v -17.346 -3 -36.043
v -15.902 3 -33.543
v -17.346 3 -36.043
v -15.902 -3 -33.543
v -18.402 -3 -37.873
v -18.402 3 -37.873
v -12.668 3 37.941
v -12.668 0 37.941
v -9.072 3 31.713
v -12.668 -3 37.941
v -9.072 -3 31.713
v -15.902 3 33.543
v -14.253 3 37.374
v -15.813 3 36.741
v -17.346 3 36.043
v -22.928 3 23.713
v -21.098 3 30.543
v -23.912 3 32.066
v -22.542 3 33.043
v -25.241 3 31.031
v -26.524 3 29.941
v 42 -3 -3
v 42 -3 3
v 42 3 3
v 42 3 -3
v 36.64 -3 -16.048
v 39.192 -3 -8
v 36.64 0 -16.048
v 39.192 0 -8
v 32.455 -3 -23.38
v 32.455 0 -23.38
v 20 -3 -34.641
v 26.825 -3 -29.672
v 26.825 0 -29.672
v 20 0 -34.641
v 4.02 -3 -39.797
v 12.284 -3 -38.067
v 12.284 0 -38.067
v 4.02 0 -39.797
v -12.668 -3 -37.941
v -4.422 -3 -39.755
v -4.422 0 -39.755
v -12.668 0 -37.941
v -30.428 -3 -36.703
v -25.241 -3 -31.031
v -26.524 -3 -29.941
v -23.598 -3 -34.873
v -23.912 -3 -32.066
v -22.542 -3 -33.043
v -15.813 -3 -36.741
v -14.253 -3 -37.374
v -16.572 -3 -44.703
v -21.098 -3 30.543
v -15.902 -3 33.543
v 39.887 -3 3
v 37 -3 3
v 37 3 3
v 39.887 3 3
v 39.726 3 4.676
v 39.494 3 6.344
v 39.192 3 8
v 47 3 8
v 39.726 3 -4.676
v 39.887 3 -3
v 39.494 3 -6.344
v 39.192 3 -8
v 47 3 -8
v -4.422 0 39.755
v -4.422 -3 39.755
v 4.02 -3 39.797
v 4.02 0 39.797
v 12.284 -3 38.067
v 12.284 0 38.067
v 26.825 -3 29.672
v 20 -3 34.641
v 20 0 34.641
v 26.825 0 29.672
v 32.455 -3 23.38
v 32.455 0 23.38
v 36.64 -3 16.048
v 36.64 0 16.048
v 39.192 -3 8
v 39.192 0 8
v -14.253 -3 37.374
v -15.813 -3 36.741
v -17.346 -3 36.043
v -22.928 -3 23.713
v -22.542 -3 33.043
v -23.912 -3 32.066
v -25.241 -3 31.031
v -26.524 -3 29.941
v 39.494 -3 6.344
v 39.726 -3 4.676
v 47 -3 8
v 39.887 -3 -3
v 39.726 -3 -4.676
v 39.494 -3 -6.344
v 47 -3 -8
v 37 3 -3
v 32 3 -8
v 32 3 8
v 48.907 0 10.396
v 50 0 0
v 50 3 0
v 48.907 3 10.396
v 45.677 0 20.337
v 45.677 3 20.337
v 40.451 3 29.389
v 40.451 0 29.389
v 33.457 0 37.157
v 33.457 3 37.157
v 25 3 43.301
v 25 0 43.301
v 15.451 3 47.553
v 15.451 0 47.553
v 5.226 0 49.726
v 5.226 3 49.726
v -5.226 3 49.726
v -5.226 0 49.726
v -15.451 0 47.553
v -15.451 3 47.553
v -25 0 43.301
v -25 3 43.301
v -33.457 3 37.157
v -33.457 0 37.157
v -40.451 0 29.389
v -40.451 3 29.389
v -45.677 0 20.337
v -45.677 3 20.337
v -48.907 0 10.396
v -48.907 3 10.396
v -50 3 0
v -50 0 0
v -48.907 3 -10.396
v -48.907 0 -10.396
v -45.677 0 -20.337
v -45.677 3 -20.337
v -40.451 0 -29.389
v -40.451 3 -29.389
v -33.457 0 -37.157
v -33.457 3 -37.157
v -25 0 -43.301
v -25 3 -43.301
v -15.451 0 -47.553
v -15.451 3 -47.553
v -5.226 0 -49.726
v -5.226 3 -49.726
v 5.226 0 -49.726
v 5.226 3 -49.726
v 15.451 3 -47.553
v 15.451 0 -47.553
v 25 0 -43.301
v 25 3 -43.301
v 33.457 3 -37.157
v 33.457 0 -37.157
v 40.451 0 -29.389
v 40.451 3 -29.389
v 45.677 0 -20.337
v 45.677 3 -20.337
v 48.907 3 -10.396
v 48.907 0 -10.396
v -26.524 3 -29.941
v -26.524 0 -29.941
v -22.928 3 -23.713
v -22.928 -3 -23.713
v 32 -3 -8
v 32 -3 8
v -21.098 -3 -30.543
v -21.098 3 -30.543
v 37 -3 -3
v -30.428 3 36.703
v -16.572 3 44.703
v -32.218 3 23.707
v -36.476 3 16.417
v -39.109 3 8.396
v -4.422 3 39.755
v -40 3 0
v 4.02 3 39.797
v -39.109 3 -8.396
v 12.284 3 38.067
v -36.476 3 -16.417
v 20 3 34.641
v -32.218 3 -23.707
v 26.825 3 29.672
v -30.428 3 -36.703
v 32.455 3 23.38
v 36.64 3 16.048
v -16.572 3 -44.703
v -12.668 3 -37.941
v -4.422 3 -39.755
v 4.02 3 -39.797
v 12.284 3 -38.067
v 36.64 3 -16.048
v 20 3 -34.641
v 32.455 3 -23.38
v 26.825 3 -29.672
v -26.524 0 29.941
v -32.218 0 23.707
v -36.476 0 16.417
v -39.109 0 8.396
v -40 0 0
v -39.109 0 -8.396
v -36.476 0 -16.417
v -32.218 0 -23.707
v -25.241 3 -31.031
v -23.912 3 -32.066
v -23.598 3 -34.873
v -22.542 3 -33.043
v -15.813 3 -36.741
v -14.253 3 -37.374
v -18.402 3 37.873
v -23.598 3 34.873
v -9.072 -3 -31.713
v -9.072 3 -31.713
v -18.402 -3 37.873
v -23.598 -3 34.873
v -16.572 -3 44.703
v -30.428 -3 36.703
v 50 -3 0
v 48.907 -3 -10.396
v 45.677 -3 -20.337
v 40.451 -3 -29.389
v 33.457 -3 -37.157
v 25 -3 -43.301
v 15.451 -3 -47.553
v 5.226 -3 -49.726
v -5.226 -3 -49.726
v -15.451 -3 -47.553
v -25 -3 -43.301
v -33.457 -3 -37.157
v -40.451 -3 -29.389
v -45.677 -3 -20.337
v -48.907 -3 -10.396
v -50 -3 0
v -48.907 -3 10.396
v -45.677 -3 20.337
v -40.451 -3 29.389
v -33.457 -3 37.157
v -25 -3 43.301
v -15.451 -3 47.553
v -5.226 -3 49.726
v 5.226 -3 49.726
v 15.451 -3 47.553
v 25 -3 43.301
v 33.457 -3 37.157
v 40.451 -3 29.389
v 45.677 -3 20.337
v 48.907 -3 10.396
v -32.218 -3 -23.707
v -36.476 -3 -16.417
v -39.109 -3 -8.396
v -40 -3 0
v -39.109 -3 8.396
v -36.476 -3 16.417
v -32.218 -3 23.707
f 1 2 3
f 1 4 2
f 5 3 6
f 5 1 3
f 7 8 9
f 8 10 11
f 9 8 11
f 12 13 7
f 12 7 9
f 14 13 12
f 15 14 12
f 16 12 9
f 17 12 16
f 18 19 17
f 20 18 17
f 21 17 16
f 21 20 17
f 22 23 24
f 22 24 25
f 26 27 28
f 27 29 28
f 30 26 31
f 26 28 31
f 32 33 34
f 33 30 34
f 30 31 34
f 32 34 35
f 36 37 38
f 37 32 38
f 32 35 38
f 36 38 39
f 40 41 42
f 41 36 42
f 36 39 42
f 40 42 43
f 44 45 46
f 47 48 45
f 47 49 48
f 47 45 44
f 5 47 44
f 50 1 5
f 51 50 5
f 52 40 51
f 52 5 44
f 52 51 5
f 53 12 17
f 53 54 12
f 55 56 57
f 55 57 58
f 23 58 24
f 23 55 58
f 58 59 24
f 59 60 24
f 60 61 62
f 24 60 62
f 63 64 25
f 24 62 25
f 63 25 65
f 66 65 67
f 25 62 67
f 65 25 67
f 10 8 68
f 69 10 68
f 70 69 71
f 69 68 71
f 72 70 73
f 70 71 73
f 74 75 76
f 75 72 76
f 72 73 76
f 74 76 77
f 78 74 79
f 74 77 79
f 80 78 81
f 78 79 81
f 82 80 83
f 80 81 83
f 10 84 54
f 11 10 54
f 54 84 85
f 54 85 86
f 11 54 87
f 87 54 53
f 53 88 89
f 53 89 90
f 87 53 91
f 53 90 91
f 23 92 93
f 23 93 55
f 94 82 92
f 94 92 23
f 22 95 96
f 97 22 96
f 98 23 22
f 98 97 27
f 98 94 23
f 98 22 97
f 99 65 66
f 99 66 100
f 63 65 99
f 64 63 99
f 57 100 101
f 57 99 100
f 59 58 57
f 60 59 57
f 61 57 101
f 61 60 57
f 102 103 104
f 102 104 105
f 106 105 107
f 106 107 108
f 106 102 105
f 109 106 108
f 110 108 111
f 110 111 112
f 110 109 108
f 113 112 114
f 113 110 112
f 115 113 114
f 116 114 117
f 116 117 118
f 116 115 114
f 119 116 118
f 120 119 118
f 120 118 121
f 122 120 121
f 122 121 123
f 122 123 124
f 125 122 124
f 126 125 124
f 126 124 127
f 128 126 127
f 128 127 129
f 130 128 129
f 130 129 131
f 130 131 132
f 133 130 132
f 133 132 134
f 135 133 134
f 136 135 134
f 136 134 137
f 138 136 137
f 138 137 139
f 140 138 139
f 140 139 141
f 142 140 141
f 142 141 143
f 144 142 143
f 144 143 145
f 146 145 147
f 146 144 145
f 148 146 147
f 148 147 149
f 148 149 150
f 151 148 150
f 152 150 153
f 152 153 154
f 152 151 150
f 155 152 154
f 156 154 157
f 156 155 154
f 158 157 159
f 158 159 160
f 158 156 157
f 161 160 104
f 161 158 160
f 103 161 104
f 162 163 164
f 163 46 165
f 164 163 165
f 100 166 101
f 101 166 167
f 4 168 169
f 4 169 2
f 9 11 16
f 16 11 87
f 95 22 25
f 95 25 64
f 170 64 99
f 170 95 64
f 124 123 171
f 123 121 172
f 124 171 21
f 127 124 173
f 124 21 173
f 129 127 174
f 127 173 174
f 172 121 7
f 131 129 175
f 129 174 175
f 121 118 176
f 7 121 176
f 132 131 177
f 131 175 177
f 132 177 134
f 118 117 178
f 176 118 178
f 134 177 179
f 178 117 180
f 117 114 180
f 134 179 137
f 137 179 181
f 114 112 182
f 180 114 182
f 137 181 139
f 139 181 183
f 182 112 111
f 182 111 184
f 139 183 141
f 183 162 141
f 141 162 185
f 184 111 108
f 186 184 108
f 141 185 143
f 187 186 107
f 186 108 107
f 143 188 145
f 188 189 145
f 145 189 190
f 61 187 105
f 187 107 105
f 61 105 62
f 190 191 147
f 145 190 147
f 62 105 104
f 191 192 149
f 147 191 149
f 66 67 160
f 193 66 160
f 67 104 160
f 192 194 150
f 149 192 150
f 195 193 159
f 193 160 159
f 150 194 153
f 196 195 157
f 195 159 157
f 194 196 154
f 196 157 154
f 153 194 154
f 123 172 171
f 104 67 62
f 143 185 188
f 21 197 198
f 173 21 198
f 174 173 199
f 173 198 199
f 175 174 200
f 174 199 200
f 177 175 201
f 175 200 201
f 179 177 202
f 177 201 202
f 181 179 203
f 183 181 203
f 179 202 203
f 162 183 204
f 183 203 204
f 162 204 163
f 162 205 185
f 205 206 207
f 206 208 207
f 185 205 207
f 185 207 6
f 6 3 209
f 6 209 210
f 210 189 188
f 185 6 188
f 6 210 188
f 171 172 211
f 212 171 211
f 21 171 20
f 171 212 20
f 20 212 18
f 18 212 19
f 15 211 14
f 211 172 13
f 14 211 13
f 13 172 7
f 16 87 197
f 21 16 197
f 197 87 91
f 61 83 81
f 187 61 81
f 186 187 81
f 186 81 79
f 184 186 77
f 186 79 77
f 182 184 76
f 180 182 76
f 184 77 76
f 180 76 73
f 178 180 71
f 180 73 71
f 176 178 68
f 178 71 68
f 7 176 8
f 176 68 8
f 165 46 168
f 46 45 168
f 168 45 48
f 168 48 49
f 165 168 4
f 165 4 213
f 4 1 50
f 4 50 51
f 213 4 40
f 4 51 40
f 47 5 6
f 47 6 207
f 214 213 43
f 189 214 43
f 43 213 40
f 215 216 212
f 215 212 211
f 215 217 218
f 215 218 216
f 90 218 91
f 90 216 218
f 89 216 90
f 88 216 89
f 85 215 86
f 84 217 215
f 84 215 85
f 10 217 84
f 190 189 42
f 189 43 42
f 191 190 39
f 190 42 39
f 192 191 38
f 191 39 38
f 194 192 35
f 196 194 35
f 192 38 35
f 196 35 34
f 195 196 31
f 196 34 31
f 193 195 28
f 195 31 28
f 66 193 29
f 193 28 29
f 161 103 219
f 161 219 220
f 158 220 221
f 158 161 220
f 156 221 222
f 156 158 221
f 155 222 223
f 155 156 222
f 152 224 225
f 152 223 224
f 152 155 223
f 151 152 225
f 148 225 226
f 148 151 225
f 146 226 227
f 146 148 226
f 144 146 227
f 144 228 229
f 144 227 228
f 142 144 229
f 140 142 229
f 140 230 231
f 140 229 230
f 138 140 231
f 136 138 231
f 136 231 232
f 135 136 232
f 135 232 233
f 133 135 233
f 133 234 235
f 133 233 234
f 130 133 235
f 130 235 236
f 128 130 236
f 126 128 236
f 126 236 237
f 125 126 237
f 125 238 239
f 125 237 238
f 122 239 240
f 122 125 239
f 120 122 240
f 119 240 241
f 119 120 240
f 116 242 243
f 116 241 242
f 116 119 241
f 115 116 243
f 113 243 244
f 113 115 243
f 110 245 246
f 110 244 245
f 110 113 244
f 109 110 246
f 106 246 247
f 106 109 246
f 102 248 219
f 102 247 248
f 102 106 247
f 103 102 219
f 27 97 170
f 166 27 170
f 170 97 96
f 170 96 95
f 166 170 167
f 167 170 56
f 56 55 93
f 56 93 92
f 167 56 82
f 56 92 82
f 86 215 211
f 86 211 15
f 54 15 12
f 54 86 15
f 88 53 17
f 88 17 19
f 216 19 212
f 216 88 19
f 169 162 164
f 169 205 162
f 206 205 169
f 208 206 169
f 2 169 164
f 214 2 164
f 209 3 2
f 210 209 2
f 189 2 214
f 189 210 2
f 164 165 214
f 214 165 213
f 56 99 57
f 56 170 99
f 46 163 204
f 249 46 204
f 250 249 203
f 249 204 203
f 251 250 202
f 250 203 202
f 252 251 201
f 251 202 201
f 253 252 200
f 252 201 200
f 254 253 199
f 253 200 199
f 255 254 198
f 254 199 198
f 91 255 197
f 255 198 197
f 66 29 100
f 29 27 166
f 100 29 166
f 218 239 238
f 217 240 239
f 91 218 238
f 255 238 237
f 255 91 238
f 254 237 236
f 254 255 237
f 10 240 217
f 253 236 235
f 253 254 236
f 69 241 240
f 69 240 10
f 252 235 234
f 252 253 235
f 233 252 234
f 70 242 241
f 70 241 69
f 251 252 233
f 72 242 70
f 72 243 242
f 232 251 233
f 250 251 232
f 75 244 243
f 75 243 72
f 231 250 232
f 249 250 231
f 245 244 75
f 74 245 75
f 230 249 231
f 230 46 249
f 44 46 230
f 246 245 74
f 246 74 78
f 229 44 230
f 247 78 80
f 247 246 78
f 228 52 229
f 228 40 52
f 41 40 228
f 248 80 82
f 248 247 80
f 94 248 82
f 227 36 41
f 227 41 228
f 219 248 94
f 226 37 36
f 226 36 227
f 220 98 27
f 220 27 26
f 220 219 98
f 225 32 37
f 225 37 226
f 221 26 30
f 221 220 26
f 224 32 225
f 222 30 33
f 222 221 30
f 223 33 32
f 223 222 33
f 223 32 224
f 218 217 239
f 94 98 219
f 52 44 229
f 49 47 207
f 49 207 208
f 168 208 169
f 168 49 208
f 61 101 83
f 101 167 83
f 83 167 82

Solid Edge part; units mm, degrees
sketch "Sketch1" plane through (0, 0, 0) normal (0, -1, 0) x (1, 0, 0)
  circle A0 centre (0, 0) radius 50
  circle A1 centre (0, 0) radius 40
  dimension "D1" = 100
  dimension "D2" = 80
extrude "Protrusion1" add sketch "Sketch1" along normal mid plane 6
sketch "Sketch2" plane through (0, -3, 0) normal (0, -1, 0) x (1, 0, 0)
  line L0 (32, 8) -> (47, 8)
  line L1 (47, 8) -> (47, -8)
  line L2 (47, -8) -> (32, -8)
  line L3 (32, -8) -> (32, 8)
extrude "Protrusion2" add sketch "Sketch2" against normal up to vertex (6 mm away)
pattern_circular "Pattern1" count 3 over 360 about axis through (0, -3, 0) along (0, -1, 0) of "Protrusion2"
sketch "Sketch3" plane through (0, -3, 0) normal (0, -1, 0) x (1, 0, 0)
  line L0 (42, 3) -> (42, -3)
  line L1 (42, -3) -> (37, -3)
  line L2 (37, -3) -> (37, 3)
  line L3 (37, 3) -> (42, 3)
extrude "Cutout1" cut sketch "Sketch3" against normal up to vertex (6 mm away)
pattern_circular "Pattern2" count 3 over 360 about axis through (0, -3, 0) along (0, -1, 0) of "Cutout1"
